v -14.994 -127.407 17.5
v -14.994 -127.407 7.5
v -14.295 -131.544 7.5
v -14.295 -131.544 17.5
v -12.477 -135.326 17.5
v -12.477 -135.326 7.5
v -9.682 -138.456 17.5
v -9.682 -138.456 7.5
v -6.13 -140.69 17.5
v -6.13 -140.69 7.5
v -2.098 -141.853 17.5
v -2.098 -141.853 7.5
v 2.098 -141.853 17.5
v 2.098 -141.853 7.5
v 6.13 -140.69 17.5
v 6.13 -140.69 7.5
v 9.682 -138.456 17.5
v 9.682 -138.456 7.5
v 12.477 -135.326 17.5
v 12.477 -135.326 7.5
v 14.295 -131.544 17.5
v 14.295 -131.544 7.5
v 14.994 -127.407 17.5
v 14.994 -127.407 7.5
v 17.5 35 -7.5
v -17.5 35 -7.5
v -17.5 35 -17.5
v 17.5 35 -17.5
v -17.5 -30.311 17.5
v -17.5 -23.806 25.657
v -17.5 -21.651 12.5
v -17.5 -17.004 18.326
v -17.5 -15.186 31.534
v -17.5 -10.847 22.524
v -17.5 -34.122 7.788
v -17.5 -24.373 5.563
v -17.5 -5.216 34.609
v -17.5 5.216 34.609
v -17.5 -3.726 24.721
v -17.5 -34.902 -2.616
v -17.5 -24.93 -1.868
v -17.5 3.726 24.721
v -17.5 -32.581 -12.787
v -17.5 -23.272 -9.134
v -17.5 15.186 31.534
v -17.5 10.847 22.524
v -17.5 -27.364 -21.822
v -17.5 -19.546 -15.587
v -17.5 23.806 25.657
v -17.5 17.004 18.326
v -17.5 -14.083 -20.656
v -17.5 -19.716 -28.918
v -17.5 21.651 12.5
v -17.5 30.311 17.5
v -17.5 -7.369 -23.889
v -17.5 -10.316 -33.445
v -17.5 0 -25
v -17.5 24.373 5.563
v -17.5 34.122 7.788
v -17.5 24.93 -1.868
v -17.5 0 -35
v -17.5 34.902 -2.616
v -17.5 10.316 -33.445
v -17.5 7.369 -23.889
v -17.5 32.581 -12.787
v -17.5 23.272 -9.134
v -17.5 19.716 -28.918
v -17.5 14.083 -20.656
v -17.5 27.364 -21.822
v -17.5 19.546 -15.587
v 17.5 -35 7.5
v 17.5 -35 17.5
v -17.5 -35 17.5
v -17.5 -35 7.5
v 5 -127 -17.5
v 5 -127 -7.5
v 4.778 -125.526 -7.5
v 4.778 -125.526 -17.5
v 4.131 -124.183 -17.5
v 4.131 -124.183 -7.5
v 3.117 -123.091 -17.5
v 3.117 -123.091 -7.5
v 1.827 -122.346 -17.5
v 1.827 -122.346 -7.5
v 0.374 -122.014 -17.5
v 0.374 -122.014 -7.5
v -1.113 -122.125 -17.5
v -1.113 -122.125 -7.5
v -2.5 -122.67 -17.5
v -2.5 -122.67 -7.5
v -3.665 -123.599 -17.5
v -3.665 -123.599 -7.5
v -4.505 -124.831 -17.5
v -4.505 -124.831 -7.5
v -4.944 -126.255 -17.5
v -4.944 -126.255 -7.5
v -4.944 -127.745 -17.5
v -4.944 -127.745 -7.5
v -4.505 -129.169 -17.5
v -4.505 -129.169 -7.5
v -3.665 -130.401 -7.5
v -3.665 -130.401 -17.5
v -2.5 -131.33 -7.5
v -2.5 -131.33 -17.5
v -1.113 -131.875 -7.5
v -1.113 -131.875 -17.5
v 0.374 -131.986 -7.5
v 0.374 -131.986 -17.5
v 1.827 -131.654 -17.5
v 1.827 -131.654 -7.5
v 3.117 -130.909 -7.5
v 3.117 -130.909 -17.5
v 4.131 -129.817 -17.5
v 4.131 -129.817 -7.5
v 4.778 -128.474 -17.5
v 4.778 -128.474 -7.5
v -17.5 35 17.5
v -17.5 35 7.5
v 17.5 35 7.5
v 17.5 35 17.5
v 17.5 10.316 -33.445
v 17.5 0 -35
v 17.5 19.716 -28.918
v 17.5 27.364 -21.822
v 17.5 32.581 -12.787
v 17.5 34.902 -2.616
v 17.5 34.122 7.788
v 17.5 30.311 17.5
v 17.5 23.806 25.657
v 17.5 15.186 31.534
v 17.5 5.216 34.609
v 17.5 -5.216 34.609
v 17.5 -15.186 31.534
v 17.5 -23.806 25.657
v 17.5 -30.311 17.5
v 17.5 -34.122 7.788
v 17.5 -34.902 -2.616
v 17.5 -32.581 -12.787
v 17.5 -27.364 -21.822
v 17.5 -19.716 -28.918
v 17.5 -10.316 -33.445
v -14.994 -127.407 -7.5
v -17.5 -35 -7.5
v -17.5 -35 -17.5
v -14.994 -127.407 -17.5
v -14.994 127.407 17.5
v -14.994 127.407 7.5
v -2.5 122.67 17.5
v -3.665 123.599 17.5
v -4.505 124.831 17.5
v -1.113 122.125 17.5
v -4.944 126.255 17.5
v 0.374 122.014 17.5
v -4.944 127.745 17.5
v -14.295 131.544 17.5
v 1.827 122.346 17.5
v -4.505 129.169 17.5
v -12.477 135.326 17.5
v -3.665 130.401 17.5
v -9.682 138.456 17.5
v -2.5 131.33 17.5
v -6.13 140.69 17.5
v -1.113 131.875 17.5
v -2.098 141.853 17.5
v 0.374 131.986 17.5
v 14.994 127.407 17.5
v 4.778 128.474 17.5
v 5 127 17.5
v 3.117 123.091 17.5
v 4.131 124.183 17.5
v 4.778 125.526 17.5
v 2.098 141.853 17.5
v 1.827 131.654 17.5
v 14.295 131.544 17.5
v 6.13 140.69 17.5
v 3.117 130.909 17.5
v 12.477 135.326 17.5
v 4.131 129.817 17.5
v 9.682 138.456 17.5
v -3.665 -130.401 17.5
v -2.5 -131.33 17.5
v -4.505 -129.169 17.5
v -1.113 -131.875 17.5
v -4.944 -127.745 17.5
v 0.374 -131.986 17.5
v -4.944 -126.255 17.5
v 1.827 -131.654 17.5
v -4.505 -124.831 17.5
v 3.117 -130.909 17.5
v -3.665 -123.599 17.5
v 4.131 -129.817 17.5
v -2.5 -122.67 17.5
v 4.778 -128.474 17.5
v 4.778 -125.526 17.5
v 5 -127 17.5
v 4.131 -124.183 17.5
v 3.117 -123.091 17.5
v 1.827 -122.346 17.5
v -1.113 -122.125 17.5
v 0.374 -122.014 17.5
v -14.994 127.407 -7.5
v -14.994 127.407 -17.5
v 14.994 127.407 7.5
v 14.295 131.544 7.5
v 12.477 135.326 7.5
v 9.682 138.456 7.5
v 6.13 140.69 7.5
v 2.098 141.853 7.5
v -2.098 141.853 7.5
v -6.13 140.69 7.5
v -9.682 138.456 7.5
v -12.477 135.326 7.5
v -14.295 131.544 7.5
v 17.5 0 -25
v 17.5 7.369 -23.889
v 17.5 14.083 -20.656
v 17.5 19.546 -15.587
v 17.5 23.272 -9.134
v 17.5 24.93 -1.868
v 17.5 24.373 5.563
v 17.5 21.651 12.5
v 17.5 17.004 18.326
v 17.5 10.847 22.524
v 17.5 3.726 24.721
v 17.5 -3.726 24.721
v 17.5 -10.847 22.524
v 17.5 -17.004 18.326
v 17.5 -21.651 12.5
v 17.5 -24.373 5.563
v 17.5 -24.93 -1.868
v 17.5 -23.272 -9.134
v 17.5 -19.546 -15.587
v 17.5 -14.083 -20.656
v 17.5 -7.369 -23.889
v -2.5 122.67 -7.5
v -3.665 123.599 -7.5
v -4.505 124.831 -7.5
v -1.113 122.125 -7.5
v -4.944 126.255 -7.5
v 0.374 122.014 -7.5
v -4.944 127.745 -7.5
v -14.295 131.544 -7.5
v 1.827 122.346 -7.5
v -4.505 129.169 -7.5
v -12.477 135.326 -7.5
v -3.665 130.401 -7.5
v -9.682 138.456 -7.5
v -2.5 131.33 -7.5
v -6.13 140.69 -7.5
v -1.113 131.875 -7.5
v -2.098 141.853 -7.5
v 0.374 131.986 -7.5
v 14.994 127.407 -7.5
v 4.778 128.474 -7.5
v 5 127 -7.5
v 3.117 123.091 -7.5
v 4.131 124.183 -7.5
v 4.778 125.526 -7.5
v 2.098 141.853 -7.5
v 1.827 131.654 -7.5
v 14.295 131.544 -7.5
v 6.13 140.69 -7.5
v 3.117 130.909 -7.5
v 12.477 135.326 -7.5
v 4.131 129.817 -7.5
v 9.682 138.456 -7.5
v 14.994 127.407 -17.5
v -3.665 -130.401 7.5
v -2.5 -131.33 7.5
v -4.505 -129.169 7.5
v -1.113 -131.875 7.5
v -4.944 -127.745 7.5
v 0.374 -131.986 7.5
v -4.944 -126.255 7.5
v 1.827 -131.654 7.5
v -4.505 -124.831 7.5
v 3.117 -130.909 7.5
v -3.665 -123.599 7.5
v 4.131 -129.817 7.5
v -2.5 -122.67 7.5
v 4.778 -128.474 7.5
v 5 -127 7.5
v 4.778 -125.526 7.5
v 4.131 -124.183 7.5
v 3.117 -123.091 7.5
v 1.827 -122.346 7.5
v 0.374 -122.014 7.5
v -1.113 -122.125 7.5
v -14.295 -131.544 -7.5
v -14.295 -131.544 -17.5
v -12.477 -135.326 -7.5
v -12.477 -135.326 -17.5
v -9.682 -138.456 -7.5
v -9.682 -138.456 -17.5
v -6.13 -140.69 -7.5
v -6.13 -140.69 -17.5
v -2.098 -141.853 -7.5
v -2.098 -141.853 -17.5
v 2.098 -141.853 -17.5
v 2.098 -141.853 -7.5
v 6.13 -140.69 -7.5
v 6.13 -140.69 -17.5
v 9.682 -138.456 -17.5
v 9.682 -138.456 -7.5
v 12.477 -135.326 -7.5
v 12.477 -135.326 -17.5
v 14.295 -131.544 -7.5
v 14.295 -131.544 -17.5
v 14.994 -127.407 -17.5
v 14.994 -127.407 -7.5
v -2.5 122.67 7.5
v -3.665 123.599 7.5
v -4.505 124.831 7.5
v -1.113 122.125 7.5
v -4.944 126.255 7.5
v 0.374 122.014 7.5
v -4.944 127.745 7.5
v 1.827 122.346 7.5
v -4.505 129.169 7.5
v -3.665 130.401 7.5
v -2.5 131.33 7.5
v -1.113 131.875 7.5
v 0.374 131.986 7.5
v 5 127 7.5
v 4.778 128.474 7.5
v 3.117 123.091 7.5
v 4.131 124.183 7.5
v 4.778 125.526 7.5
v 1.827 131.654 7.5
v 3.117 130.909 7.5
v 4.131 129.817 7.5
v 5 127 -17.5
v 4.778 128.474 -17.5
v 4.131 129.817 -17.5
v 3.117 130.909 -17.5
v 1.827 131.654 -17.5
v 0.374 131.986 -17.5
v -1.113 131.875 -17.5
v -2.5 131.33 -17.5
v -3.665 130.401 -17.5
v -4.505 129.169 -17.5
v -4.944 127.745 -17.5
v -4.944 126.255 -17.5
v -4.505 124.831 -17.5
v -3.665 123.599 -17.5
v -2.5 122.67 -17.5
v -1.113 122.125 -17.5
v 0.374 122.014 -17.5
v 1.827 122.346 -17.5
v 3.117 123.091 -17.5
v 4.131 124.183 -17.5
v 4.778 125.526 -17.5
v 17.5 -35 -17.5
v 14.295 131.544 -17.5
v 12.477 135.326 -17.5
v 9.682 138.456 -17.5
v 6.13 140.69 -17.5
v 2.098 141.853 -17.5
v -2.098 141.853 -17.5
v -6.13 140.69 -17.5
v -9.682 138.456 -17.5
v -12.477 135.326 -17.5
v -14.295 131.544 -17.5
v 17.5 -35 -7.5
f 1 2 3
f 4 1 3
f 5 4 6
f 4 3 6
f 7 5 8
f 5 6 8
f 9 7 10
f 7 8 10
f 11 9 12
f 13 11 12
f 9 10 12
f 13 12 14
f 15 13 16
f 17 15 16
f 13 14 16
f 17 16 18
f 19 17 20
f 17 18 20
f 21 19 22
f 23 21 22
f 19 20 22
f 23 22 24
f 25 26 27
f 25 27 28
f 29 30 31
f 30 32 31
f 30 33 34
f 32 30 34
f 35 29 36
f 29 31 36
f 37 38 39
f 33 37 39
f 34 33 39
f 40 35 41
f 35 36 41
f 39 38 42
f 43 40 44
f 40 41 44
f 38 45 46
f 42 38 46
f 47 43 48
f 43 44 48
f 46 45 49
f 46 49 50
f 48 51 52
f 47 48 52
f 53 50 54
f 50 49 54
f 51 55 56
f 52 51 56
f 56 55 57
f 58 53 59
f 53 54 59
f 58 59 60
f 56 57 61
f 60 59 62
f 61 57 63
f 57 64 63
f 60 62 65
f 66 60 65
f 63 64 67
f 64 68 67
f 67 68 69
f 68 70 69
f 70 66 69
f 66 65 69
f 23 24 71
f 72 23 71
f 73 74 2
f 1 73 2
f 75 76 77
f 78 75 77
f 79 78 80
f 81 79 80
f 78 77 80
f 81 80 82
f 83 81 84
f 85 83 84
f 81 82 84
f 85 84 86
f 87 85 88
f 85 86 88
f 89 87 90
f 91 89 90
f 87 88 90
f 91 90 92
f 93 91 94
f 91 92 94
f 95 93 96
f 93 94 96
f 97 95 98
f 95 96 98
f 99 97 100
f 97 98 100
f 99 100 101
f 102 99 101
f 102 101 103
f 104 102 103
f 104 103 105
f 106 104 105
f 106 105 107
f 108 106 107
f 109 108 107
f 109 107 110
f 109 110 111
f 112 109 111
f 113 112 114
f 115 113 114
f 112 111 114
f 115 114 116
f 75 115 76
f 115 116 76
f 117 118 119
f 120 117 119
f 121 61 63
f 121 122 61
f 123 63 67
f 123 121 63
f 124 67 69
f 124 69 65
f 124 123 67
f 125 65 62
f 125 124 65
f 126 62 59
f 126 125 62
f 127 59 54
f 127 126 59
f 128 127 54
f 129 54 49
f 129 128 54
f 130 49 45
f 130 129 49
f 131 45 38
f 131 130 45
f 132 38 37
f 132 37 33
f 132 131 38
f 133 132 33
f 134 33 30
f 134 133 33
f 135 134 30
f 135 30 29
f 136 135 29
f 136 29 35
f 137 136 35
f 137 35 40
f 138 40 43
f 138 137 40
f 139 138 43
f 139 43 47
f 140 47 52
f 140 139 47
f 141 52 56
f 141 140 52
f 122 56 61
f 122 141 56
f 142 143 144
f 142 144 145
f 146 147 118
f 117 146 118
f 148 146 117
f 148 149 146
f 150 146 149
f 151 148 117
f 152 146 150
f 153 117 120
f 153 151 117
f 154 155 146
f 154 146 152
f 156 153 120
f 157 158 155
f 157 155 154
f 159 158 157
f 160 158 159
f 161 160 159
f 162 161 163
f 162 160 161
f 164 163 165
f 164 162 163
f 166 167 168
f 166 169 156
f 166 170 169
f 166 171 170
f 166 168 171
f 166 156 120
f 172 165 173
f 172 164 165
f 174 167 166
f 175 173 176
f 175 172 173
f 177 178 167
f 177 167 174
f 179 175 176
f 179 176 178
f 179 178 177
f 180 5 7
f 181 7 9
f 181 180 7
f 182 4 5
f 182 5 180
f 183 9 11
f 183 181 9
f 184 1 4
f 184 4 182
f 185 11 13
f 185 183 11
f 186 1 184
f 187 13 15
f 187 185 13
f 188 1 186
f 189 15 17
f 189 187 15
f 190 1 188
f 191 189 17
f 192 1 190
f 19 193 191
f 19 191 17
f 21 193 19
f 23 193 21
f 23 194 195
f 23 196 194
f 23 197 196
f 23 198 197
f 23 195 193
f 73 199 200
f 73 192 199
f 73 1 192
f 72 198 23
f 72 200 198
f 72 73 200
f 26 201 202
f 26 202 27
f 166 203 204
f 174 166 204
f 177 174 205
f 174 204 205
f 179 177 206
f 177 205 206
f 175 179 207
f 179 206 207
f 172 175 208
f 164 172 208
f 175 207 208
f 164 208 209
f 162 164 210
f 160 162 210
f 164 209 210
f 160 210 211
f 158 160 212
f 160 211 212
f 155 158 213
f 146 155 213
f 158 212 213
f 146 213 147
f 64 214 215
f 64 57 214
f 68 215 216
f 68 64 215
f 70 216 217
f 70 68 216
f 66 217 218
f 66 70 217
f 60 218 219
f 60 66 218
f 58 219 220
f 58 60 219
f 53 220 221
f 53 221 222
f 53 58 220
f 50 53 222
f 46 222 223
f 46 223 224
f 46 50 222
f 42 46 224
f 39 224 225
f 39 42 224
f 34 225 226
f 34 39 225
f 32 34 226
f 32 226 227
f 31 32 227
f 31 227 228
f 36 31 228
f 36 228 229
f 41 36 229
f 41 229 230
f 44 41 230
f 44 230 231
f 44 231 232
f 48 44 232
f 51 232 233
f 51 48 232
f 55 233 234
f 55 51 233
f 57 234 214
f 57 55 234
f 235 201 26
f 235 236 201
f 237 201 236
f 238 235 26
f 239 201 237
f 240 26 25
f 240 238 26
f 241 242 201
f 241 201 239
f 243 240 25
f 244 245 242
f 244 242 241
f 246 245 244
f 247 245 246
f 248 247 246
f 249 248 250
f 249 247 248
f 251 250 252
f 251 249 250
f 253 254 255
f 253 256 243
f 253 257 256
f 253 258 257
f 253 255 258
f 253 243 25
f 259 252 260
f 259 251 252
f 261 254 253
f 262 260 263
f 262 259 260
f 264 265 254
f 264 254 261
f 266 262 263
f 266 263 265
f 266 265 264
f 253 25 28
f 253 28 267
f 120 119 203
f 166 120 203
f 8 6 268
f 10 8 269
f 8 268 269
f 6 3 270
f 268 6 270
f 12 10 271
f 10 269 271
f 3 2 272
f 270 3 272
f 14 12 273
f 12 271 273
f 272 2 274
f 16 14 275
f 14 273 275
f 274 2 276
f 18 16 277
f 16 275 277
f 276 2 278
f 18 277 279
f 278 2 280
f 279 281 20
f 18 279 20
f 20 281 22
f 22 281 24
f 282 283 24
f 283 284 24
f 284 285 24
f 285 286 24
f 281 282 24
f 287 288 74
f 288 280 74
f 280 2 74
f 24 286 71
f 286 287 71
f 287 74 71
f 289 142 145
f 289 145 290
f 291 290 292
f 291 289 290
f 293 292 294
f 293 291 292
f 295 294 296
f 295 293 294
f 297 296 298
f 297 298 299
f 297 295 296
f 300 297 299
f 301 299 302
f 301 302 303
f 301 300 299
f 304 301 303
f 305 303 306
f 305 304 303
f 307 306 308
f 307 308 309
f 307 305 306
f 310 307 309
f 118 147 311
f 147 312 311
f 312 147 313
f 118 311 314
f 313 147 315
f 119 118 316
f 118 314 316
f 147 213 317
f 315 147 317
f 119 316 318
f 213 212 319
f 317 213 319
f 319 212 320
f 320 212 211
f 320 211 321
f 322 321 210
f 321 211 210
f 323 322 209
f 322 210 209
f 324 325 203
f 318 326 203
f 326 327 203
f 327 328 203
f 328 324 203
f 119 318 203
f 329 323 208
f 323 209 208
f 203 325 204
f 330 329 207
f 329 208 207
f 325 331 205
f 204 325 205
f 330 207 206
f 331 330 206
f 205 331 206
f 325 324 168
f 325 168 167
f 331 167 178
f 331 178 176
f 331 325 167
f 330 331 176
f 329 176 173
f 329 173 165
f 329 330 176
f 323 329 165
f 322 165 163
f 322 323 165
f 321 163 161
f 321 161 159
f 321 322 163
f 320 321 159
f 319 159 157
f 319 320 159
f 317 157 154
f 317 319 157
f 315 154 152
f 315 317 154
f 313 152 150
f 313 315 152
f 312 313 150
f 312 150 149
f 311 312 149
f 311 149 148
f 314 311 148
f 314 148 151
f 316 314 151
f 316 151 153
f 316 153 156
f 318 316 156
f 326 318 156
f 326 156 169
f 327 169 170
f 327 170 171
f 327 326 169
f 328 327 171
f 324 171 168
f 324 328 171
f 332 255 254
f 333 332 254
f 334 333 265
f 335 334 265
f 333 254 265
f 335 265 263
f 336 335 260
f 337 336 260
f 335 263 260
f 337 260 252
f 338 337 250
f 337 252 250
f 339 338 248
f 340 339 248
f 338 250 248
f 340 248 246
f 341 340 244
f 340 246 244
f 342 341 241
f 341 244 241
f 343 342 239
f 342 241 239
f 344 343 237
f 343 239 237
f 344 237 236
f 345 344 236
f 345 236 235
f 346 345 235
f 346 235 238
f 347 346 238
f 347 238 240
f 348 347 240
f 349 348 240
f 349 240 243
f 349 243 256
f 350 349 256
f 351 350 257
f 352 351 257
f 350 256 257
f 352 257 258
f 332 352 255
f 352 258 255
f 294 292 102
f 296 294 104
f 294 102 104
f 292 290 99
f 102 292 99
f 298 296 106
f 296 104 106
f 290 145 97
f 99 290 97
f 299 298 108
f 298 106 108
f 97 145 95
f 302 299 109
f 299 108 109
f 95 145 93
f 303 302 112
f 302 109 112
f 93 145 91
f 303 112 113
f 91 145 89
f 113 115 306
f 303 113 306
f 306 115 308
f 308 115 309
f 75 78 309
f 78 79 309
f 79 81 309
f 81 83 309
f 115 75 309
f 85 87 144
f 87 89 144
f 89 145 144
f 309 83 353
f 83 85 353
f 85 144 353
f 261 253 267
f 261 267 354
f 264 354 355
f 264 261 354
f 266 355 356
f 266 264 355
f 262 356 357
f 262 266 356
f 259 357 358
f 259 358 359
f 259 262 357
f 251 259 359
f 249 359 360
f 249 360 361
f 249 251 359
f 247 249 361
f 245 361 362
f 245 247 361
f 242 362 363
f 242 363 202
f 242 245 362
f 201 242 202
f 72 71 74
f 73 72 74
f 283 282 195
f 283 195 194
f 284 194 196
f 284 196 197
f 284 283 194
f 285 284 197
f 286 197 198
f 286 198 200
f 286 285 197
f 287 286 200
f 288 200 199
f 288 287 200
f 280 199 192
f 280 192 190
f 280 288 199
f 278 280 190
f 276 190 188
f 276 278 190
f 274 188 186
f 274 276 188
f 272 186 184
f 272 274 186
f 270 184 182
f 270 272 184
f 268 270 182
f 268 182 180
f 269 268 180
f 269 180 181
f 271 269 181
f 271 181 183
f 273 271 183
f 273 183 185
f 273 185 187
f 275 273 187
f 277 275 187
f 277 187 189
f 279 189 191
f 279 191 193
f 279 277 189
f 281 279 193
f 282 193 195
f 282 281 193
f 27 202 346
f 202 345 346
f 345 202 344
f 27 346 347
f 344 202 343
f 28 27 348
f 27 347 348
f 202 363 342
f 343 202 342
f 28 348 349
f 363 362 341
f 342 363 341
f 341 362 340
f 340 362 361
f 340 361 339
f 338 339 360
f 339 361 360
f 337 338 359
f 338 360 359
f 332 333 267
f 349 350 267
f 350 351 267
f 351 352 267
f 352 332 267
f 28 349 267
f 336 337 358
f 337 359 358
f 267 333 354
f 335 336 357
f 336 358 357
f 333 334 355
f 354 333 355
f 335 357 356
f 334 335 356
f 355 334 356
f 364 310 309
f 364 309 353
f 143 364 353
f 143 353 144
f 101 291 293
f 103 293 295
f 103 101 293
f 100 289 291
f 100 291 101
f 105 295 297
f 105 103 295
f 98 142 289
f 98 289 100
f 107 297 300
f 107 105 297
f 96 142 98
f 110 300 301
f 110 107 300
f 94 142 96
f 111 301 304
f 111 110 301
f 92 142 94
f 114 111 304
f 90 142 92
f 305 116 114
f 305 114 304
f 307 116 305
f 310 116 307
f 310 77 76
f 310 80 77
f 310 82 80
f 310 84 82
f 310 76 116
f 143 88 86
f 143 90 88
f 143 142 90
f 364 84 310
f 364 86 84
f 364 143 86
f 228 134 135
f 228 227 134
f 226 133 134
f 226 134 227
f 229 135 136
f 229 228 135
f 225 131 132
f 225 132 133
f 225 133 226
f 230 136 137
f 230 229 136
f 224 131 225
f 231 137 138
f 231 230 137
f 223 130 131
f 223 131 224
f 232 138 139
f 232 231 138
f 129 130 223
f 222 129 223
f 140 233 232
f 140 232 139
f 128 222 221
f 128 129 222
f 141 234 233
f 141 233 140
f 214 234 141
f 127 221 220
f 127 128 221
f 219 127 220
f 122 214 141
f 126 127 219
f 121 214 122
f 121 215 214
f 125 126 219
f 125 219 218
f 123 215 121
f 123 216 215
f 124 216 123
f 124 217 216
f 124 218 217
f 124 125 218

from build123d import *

# Parameters (mm, degrees)
SKETCH1_R             = 35
SKETCH1_R_2           = 25
BOSS_EXTRUDE1_DEPTH   = 17.5
SKETCH5_R             = 5
BOSS_EXTRUDE3_DEPTH   = 10
BOSS_EXTRUDE3_2_DEPTH = 10
SKETCH4_R             = 5
BOSS_EXTRUDE5_DEPTH   = 10
BOSS_EXTRUDE5_2_DEPTH = 10


with BuildPart() as part:
    # Sketch1 → Boss-Extrude1 (new body, symmetric)
    with BuildSketch(Plane(origin=(0, 0, 0), x_dir=(0, 0, -1), z_dir=(1, 0, 0))):
        Circle(SKETCH1_R)
        Circle(SKETCH1_R_2, mode=Mode.SUBTRACT)
    extrude(amount=BOSS_EXTRUDE1_DEPTH, both=True)


with BuildPart() as body_2:
    # Sketch5 → Boss-Extrude3 (new body)
    with BuildSketch(Plane.XY.offset(-7.5)):
        with BuildLine():
            Line((-17.5, -35), (-14.994489274, -127.40656046))
            ThreePointArc((-14.994489274, -127.40656046), (0, -142), (14.994489274, -127.40656046))
            Line((14.994489274, -127.40656046), (17.5, -35))
            Line((17.5, -35), (-17.5, -35))
        make_face()
        with Locations((0, -127)):
            Circle(SKETCH5_R, mode=Mode.SUBTRACT)
    extrude(amount=-BOSS_EXTRUDE3_DEPTH)


with BuildPart() as body_3:
    # Sketch5 → Boss-Extrude3 2 (new body)
    with BuildSketch(Plane.XY.offset(-7.5)):
        with BuildLine():
            Line((-17.5, 35), (17.5, 35))
            Line((17.5, 35), (14.994489274, 127.40656046))
            ThreePointArc((14.994489274, 127.40656046), (0, 142), (-14.994489274, 127.40656046))
            Line((-14.994489274, 127.40656046), (-17.5, 35))
        make_face()
        with Locations((0, 127)):
            Circle(SKETCH5_R, mode=Mode.SUBTRACT)
    extrude(amount=-BOSS_EXTRUDE3_2_DEPTH)


with BuildPart() as body_4:
    # Sketch4 → Boss-Extrude5 (new body)
    with BuildSketch(Plane.XY.offset(7.5)):
        with BuildLine():
            Line((-17.5, -35), (-14.994489274, -127.40656046))
            ThreePointArc((-14.994489274, -127.40656046), (0, -142), (14.994489274, -127.40656046))
            Line((14.994489274, -127.40656046), (17.5, -35))
            Line((17.5, -35), (-17.5, -35))
        make_face()
        with Locations((0, -127)):
            Circle(SKETCH4_R, mode=Mode.SUBTRACT)
    extrude(amount=BOSS_EXTRUDE5_DEPTH)


with BuildPart() as body_5:
    # Sketch4 → Boss-Extrude5 2 (new body)
    with BuildSketch(Plane.XY.offset(7.5)):
        with BuildLine():
            Line((-17.5, 35), (17.5, 35))
            Line((17.5, 35), (14.994489274, 127.40656046))
            ThreePointArc((14.994489274, 127.40656046), (0, 142), (-14.994489274, 127.40656046))
            Line((-14.994489274, 127.40656046), (-17.5, 35))
        make_face()
        with Locations((0, 127)):
            Circle(SKETCH4_R, mode=Mode.SUBTRACT)
    extrude(amount=BOSS_EXTRUDE5_2_DEPTH)


solid = Compound([part.part, body_2.part, body_3.part, body_4.part, body_5.part])
